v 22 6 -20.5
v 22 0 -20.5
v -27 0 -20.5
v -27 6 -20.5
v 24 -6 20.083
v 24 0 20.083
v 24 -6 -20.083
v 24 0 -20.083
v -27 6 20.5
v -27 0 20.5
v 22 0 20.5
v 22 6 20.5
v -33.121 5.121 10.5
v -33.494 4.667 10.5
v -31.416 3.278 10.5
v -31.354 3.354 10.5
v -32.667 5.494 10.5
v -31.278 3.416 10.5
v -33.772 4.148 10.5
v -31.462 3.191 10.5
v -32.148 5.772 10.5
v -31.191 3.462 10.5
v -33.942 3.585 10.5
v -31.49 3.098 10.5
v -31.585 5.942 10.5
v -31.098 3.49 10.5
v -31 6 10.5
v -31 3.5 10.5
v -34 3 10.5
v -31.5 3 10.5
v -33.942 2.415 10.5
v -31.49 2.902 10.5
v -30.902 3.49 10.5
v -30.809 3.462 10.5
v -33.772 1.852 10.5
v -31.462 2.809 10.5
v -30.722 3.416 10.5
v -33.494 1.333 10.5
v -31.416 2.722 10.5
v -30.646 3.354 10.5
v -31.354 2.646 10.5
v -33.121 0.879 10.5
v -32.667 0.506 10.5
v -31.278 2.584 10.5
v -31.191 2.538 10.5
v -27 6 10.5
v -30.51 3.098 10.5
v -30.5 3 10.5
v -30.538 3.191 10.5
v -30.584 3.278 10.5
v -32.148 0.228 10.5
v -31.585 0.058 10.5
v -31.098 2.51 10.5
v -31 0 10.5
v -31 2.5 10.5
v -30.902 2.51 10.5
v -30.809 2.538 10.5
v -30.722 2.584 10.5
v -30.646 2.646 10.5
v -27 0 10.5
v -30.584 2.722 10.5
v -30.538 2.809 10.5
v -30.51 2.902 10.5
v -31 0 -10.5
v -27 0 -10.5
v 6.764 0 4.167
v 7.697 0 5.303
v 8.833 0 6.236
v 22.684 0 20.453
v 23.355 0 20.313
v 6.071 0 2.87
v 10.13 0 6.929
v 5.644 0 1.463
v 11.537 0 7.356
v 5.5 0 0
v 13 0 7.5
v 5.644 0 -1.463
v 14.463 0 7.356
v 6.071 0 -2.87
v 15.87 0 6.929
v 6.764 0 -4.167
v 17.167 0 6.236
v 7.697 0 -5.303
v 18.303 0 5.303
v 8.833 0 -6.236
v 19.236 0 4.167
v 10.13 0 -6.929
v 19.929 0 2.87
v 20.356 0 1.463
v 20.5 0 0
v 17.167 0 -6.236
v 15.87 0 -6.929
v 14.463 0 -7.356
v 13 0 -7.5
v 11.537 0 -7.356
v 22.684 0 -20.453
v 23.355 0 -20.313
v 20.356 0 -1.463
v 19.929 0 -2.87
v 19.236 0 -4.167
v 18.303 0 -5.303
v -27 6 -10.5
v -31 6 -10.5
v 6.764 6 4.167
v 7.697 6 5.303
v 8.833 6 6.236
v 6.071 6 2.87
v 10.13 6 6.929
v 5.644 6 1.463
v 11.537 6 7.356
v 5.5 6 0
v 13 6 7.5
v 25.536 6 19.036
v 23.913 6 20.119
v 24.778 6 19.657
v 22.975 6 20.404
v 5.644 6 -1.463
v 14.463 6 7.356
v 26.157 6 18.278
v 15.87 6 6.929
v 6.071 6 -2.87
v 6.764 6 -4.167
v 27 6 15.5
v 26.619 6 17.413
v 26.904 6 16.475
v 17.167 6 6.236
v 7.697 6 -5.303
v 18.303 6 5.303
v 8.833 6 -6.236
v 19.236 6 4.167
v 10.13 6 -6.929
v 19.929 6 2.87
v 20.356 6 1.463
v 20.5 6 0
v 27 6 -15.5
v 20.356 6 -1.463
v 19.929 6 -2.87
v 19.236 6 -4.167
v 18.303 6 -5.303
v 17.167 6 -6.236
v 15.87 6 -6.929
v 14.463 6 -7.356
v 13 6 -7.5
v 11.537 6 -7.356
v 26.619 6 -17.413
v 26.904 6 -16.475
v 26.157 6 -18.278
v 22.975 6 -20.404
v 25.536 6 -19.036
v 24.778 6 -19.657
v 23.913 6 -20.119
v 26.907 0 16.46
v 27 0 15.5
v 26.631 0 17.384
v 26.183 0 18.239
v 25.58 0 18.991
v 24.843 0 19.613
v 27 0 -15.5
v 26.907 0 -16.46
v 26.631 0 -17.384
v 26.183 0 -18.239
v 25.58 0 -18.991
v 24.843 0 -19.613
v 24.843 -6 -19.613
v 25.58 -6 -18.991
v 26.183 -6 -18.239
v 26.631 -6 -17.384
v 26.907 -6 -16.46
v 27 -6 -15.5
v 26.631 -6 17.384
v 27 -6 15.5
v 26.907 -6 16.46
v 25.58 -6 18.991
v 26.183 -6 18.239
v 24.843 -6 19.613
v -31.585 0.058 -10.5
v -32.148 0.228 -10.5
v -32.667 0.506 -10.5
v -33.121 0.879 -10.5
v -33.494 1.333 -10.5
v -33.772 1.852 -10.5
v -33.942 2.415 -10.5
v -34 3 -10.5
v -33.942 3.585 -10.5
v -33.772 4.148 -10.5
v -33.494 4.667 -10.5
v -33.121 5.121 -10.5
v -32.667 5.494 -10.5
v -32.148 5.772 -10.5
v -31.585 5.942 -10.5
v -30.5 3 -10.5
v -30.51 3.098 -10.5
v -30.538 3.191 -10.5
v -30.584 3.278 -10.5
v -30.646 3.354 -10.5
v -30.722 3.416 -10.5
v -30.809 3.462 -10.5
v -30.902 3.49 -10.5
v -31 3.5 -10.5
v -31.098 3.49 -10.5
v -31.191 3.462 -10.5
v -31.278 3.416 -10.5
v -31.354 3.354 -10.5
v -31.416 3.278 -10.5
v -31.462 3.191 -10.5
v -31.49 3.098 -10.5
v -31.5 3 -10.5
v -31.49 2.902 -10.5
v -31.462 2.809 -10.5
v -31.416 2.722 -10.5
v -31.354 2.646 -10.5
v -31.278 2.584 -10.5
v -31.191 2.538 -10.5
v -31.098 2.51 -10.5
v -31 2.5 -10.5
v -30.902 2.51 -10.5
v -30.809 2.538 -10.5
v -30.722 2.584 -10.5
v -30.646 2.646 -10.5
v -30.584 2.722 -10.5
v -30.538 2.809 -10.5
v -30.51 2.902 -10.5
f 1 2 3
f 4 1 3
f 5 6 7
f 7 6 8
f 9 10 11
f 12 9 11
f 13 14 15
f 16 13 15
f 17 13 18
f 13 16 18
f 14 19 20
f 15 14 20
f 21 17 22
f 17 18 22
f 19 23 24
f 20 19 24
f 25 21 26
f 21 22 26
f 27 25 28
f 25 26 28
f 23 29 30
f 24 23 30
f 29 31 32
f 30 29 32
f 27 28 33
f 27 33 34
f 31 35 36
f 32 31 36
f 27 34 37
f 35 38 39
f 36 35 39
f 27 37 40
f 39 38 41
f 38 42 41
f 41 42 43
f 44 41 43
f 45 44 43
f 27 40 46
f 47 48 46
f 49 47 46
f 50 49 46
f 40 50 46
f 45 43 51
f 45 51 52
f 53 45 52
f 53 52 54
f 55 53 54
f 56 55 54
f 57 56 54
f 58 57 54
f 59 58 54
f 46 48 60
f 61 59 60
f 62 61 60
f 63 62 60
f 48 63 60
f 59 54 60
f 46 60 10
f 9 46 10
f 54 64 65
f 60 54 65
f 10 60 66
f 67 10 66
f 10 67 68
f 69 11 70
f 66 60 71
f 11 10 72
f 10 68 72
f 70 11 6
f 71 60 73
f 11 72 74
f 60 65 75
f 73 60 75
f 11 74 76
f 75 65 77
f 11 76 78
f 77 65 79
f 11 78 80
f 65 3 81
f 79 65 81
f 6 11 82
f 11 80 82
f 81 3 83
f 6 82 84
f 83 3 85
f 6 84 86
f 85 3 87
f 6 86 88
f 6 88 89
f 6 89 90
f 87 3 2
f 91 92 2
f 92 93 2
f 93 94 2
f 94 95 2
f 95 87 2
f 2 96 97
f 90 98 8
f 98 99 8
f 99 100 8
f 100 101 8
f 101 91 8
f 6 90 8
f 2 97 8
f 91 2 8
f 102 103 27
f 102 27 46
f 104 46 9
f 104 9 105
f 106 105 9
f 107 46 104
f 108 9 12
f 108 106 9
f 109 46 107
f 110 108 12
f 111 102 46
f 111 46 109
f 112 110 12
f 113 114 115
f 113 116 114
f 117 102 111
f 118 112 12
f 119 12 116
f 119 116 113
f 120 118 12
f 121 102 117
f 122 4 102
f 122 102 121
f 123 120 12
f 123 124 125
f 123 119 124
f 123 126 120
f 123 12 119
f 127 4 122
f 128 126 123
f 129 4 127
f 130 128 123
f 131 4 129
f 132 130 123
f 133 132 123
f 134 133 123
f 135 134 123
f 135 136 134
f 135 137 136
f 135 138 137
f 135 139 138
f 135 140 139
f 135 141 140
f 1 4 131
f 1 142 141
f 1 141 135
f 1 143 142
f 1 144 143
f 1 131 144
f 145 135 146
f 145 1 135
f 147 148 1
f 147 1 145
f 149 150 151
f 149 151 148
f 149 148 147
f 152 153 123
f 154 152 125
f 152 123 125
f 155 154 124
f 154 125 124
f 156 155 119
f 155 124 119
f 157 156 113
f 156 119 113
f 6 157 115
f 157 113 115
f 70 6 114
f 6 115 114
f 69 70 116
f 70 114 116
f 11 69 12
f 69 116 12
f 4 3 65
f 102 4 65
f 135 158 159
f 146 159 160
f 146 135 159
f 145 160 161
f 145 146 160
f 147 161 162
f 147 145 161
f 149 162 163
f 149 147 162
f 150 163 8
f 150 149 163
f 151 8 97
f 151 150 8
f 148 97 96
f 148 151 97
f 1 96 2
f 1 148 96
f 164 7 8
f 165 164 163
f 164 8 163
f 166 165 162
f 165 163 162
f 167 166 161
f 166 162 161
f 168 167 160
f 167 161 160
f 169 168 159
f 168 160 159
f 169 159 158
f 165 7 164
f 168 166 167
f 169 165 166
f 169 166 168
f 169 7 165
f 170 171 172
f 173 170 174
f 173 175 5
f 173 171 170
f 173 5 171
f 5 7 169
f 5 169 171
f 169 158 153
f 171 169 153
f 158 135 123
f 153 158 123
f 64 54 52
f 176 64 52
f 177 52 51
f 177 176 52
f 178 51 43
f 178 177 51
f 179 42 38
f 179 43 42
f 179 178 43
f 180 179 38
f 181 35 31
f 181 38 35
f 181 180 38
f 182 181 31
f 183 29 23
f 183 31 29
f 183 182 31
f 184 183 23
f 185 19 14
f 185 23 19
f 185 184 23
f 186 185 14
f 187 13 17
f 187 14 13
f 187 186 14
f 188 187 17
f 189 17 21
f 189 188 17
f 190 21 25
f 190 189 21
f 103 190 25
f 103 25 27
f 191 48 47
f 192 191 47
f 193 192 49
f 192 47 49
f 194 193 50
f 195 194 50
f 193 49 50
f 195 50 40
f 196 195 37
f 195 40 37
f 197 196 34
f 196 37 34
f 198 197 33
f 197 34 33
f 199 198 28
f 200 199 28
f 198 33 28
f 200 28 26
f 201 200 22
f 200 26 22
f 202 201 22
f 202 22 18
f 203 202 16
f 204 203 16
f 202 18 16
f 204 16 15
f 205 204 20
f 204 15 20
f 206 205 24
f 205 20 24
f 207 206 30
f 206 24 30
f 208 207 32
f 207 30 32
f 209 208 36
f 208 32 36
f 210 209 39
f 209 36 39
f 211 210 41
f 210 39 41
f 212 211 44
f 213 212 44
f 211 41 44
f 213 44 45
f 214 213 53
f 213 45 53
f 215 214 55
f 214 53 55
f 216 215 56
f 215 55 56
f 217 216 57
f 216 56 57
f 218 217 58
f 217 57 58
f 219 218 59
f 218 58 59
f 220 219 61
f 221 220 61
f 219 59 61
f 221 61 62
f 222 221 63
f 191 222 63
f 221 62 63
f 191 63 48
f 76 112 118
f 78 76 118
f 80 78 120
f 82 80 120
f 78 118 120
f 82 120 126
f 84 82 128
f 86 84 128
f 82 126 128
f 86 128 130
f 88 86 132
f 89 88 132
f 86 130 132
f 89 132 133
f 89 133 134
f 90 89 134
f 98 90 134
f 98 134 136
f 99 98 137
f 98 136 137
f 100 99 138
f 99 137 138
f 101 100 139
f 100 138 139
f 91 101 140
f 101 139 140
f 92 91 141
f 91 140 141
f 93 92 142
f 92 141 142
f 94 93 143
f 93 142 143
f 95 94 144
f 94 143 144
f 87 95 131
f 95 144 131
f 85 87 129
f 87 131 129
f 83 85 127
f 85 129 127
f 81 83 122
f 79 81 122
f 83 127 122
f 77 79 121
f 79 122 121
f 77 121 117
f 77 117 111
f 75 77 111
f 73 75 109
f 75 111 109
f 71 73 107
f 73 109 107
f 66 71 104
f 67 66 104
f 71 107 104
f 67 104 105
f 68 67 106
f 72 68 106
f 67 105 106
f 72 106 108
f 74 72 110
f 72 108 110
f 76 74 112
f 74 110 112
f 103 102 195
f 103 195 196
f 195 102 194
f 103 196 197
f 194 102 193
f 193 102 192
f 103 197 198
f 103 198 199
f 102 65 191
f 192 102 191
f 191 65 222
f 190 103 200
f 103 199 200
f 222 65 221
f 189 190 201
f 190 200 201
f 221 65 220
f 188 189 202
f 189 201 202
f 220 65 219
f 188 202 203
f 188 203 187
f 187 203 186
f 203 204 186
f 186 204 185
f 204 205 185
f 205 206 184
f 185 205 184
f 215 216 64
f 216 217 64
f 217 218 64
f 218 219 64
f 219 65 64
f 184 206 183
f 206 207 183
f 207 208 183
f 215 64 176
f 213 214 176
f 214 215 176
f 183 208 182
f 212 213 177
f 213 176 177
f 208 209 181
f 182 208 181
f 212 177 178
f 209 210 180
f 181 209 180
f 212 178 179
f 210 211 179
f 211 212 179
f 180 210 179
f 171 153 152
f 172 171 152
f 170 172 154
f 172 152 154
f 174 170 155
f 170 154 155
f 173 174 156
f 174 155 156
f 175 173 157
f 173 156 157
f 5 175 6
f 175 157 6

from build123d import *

# Parameters (mm, degrees)
EXTRUDE_1_DEPTH     = 6
FILLET_1_RADIUS     = 3
FILLET_1_LENGTH     = 21
SKETCH_2_R          = 7.5
CUT_EXTRUDE_1_DEPTH = 6
FILLET_2_R          = 5
FILLET_3_R          = 5
EXTRUDE_2_DEPTH     = 6
SKETCH_4_R          = 0.5
CUT_EXTRUDE_2_DEPTH = 21


with BuildPart() as part:
    # Эскиз1 → Бобышка-Вытянуть1 (new body)
    with BuildSketch(Plane(origin=(0, 0, 0), x_dir=(1, 0, 0), z_dir=(0, 1, 0))):
        Polygon((-27, -20.5), (27, -20.5), (27, 20.5), (-27, 20.5), (-27, 10.5), (-34, 10.5), (-34, -10.5), (-27, -10.5), align=None)
    extrude(amount=EXTRUDE_1_DEPTH)

    # Скругление1: full round fillet: the end face becomes a half cylinder, R = half its width
    fillet_1_face = Plane((-34, 3, 0), x_dir=(0, 0, -1), z_dir=(-1, 0, 0))  # on the end face: x along it, z out of the body
    fillet_1_slab = fillet_1_face.offset(-FILLET_1_RADIUS / 2) * Box(FILLET_1_LENGTH, 2 * FILLET_1_RADIUS, FILLET_1_RADIUS, mode=Mode.PRIVATE)  # the body's end, R deep
    fillet_1_round = Plane((-31, 3, 0), x_dir=(-1, 0, 0), z_dir=(0, 0, -1)) * Cylinder(FILLET_1_RADIUS, FILLET_1_LENGTH, mode=Mode.PRIVATE)  # its axis R under the face
    add(fillet_1_slab - fillet_1_round, mode=Mode.SUBTRACT)

    # Эскиз2 → Вырез-Вытянуть1 (cut)
    with BuildSketch(Plane(origin=(0, 6, 0), x_dir=(1, 0, 0), z_dir=(0, 1, 0))):
        with Locations(Location((13, 0, 0), (0, 0, 270))):
            Circle(SKETCH_2_R)
    extrude(amount=-CUT_EXTRUDE_1_DEPTH, mode=Mode.SUBTRACT)

    # Скругление2
    fillet_2_edges = [part.edges().sort_by_distance(p)[0] for p in [
        (27, 3, -20.5),
    ]]
    fillet(fillet_2_edges, radius=FILLET_2_R)

    # Скругление3
    fillet_3_edges = [part.edges().sort_by_distance(p)[0] for p in [
        (27, 3, 20.5),
    ]]
    fillet(fillet_3_edges, radius=FILLET_3_R)

    # Эскиз3 → Бобышка-Вытянуть2 (add)
    with BuildSketch(Plane.XZ):
        with BuildLine():
            Line((24, 15.5), (24, -20.082575695))
            ThreePointArc((24, -20.082575695), (26.183300133, -18.238612788), (27, -15.5))
            Line((27, -15.5), (27, 15.5))
            ThreePointArc((27, 15.5), (26.183300133, 18.238612788), (24, 20.082575695))
            Line((24, 20.082575695), (24, 15.5))
        make_face()
    extrude(amount=EXTRUDE_2_DEPTH)

    # Эскиз4 → Вырез-Вытянуть2 (cut)
    with BuildSketch(Plane.XY.offset(10.5)):
        with Locations((-31, 3)):
            Circle(SKETCH_4_R)
    extrude(amount=-CUT_EXTRUDE_2_DEPTH, mode=Mode.SUBTRACT)


solid = part.part
